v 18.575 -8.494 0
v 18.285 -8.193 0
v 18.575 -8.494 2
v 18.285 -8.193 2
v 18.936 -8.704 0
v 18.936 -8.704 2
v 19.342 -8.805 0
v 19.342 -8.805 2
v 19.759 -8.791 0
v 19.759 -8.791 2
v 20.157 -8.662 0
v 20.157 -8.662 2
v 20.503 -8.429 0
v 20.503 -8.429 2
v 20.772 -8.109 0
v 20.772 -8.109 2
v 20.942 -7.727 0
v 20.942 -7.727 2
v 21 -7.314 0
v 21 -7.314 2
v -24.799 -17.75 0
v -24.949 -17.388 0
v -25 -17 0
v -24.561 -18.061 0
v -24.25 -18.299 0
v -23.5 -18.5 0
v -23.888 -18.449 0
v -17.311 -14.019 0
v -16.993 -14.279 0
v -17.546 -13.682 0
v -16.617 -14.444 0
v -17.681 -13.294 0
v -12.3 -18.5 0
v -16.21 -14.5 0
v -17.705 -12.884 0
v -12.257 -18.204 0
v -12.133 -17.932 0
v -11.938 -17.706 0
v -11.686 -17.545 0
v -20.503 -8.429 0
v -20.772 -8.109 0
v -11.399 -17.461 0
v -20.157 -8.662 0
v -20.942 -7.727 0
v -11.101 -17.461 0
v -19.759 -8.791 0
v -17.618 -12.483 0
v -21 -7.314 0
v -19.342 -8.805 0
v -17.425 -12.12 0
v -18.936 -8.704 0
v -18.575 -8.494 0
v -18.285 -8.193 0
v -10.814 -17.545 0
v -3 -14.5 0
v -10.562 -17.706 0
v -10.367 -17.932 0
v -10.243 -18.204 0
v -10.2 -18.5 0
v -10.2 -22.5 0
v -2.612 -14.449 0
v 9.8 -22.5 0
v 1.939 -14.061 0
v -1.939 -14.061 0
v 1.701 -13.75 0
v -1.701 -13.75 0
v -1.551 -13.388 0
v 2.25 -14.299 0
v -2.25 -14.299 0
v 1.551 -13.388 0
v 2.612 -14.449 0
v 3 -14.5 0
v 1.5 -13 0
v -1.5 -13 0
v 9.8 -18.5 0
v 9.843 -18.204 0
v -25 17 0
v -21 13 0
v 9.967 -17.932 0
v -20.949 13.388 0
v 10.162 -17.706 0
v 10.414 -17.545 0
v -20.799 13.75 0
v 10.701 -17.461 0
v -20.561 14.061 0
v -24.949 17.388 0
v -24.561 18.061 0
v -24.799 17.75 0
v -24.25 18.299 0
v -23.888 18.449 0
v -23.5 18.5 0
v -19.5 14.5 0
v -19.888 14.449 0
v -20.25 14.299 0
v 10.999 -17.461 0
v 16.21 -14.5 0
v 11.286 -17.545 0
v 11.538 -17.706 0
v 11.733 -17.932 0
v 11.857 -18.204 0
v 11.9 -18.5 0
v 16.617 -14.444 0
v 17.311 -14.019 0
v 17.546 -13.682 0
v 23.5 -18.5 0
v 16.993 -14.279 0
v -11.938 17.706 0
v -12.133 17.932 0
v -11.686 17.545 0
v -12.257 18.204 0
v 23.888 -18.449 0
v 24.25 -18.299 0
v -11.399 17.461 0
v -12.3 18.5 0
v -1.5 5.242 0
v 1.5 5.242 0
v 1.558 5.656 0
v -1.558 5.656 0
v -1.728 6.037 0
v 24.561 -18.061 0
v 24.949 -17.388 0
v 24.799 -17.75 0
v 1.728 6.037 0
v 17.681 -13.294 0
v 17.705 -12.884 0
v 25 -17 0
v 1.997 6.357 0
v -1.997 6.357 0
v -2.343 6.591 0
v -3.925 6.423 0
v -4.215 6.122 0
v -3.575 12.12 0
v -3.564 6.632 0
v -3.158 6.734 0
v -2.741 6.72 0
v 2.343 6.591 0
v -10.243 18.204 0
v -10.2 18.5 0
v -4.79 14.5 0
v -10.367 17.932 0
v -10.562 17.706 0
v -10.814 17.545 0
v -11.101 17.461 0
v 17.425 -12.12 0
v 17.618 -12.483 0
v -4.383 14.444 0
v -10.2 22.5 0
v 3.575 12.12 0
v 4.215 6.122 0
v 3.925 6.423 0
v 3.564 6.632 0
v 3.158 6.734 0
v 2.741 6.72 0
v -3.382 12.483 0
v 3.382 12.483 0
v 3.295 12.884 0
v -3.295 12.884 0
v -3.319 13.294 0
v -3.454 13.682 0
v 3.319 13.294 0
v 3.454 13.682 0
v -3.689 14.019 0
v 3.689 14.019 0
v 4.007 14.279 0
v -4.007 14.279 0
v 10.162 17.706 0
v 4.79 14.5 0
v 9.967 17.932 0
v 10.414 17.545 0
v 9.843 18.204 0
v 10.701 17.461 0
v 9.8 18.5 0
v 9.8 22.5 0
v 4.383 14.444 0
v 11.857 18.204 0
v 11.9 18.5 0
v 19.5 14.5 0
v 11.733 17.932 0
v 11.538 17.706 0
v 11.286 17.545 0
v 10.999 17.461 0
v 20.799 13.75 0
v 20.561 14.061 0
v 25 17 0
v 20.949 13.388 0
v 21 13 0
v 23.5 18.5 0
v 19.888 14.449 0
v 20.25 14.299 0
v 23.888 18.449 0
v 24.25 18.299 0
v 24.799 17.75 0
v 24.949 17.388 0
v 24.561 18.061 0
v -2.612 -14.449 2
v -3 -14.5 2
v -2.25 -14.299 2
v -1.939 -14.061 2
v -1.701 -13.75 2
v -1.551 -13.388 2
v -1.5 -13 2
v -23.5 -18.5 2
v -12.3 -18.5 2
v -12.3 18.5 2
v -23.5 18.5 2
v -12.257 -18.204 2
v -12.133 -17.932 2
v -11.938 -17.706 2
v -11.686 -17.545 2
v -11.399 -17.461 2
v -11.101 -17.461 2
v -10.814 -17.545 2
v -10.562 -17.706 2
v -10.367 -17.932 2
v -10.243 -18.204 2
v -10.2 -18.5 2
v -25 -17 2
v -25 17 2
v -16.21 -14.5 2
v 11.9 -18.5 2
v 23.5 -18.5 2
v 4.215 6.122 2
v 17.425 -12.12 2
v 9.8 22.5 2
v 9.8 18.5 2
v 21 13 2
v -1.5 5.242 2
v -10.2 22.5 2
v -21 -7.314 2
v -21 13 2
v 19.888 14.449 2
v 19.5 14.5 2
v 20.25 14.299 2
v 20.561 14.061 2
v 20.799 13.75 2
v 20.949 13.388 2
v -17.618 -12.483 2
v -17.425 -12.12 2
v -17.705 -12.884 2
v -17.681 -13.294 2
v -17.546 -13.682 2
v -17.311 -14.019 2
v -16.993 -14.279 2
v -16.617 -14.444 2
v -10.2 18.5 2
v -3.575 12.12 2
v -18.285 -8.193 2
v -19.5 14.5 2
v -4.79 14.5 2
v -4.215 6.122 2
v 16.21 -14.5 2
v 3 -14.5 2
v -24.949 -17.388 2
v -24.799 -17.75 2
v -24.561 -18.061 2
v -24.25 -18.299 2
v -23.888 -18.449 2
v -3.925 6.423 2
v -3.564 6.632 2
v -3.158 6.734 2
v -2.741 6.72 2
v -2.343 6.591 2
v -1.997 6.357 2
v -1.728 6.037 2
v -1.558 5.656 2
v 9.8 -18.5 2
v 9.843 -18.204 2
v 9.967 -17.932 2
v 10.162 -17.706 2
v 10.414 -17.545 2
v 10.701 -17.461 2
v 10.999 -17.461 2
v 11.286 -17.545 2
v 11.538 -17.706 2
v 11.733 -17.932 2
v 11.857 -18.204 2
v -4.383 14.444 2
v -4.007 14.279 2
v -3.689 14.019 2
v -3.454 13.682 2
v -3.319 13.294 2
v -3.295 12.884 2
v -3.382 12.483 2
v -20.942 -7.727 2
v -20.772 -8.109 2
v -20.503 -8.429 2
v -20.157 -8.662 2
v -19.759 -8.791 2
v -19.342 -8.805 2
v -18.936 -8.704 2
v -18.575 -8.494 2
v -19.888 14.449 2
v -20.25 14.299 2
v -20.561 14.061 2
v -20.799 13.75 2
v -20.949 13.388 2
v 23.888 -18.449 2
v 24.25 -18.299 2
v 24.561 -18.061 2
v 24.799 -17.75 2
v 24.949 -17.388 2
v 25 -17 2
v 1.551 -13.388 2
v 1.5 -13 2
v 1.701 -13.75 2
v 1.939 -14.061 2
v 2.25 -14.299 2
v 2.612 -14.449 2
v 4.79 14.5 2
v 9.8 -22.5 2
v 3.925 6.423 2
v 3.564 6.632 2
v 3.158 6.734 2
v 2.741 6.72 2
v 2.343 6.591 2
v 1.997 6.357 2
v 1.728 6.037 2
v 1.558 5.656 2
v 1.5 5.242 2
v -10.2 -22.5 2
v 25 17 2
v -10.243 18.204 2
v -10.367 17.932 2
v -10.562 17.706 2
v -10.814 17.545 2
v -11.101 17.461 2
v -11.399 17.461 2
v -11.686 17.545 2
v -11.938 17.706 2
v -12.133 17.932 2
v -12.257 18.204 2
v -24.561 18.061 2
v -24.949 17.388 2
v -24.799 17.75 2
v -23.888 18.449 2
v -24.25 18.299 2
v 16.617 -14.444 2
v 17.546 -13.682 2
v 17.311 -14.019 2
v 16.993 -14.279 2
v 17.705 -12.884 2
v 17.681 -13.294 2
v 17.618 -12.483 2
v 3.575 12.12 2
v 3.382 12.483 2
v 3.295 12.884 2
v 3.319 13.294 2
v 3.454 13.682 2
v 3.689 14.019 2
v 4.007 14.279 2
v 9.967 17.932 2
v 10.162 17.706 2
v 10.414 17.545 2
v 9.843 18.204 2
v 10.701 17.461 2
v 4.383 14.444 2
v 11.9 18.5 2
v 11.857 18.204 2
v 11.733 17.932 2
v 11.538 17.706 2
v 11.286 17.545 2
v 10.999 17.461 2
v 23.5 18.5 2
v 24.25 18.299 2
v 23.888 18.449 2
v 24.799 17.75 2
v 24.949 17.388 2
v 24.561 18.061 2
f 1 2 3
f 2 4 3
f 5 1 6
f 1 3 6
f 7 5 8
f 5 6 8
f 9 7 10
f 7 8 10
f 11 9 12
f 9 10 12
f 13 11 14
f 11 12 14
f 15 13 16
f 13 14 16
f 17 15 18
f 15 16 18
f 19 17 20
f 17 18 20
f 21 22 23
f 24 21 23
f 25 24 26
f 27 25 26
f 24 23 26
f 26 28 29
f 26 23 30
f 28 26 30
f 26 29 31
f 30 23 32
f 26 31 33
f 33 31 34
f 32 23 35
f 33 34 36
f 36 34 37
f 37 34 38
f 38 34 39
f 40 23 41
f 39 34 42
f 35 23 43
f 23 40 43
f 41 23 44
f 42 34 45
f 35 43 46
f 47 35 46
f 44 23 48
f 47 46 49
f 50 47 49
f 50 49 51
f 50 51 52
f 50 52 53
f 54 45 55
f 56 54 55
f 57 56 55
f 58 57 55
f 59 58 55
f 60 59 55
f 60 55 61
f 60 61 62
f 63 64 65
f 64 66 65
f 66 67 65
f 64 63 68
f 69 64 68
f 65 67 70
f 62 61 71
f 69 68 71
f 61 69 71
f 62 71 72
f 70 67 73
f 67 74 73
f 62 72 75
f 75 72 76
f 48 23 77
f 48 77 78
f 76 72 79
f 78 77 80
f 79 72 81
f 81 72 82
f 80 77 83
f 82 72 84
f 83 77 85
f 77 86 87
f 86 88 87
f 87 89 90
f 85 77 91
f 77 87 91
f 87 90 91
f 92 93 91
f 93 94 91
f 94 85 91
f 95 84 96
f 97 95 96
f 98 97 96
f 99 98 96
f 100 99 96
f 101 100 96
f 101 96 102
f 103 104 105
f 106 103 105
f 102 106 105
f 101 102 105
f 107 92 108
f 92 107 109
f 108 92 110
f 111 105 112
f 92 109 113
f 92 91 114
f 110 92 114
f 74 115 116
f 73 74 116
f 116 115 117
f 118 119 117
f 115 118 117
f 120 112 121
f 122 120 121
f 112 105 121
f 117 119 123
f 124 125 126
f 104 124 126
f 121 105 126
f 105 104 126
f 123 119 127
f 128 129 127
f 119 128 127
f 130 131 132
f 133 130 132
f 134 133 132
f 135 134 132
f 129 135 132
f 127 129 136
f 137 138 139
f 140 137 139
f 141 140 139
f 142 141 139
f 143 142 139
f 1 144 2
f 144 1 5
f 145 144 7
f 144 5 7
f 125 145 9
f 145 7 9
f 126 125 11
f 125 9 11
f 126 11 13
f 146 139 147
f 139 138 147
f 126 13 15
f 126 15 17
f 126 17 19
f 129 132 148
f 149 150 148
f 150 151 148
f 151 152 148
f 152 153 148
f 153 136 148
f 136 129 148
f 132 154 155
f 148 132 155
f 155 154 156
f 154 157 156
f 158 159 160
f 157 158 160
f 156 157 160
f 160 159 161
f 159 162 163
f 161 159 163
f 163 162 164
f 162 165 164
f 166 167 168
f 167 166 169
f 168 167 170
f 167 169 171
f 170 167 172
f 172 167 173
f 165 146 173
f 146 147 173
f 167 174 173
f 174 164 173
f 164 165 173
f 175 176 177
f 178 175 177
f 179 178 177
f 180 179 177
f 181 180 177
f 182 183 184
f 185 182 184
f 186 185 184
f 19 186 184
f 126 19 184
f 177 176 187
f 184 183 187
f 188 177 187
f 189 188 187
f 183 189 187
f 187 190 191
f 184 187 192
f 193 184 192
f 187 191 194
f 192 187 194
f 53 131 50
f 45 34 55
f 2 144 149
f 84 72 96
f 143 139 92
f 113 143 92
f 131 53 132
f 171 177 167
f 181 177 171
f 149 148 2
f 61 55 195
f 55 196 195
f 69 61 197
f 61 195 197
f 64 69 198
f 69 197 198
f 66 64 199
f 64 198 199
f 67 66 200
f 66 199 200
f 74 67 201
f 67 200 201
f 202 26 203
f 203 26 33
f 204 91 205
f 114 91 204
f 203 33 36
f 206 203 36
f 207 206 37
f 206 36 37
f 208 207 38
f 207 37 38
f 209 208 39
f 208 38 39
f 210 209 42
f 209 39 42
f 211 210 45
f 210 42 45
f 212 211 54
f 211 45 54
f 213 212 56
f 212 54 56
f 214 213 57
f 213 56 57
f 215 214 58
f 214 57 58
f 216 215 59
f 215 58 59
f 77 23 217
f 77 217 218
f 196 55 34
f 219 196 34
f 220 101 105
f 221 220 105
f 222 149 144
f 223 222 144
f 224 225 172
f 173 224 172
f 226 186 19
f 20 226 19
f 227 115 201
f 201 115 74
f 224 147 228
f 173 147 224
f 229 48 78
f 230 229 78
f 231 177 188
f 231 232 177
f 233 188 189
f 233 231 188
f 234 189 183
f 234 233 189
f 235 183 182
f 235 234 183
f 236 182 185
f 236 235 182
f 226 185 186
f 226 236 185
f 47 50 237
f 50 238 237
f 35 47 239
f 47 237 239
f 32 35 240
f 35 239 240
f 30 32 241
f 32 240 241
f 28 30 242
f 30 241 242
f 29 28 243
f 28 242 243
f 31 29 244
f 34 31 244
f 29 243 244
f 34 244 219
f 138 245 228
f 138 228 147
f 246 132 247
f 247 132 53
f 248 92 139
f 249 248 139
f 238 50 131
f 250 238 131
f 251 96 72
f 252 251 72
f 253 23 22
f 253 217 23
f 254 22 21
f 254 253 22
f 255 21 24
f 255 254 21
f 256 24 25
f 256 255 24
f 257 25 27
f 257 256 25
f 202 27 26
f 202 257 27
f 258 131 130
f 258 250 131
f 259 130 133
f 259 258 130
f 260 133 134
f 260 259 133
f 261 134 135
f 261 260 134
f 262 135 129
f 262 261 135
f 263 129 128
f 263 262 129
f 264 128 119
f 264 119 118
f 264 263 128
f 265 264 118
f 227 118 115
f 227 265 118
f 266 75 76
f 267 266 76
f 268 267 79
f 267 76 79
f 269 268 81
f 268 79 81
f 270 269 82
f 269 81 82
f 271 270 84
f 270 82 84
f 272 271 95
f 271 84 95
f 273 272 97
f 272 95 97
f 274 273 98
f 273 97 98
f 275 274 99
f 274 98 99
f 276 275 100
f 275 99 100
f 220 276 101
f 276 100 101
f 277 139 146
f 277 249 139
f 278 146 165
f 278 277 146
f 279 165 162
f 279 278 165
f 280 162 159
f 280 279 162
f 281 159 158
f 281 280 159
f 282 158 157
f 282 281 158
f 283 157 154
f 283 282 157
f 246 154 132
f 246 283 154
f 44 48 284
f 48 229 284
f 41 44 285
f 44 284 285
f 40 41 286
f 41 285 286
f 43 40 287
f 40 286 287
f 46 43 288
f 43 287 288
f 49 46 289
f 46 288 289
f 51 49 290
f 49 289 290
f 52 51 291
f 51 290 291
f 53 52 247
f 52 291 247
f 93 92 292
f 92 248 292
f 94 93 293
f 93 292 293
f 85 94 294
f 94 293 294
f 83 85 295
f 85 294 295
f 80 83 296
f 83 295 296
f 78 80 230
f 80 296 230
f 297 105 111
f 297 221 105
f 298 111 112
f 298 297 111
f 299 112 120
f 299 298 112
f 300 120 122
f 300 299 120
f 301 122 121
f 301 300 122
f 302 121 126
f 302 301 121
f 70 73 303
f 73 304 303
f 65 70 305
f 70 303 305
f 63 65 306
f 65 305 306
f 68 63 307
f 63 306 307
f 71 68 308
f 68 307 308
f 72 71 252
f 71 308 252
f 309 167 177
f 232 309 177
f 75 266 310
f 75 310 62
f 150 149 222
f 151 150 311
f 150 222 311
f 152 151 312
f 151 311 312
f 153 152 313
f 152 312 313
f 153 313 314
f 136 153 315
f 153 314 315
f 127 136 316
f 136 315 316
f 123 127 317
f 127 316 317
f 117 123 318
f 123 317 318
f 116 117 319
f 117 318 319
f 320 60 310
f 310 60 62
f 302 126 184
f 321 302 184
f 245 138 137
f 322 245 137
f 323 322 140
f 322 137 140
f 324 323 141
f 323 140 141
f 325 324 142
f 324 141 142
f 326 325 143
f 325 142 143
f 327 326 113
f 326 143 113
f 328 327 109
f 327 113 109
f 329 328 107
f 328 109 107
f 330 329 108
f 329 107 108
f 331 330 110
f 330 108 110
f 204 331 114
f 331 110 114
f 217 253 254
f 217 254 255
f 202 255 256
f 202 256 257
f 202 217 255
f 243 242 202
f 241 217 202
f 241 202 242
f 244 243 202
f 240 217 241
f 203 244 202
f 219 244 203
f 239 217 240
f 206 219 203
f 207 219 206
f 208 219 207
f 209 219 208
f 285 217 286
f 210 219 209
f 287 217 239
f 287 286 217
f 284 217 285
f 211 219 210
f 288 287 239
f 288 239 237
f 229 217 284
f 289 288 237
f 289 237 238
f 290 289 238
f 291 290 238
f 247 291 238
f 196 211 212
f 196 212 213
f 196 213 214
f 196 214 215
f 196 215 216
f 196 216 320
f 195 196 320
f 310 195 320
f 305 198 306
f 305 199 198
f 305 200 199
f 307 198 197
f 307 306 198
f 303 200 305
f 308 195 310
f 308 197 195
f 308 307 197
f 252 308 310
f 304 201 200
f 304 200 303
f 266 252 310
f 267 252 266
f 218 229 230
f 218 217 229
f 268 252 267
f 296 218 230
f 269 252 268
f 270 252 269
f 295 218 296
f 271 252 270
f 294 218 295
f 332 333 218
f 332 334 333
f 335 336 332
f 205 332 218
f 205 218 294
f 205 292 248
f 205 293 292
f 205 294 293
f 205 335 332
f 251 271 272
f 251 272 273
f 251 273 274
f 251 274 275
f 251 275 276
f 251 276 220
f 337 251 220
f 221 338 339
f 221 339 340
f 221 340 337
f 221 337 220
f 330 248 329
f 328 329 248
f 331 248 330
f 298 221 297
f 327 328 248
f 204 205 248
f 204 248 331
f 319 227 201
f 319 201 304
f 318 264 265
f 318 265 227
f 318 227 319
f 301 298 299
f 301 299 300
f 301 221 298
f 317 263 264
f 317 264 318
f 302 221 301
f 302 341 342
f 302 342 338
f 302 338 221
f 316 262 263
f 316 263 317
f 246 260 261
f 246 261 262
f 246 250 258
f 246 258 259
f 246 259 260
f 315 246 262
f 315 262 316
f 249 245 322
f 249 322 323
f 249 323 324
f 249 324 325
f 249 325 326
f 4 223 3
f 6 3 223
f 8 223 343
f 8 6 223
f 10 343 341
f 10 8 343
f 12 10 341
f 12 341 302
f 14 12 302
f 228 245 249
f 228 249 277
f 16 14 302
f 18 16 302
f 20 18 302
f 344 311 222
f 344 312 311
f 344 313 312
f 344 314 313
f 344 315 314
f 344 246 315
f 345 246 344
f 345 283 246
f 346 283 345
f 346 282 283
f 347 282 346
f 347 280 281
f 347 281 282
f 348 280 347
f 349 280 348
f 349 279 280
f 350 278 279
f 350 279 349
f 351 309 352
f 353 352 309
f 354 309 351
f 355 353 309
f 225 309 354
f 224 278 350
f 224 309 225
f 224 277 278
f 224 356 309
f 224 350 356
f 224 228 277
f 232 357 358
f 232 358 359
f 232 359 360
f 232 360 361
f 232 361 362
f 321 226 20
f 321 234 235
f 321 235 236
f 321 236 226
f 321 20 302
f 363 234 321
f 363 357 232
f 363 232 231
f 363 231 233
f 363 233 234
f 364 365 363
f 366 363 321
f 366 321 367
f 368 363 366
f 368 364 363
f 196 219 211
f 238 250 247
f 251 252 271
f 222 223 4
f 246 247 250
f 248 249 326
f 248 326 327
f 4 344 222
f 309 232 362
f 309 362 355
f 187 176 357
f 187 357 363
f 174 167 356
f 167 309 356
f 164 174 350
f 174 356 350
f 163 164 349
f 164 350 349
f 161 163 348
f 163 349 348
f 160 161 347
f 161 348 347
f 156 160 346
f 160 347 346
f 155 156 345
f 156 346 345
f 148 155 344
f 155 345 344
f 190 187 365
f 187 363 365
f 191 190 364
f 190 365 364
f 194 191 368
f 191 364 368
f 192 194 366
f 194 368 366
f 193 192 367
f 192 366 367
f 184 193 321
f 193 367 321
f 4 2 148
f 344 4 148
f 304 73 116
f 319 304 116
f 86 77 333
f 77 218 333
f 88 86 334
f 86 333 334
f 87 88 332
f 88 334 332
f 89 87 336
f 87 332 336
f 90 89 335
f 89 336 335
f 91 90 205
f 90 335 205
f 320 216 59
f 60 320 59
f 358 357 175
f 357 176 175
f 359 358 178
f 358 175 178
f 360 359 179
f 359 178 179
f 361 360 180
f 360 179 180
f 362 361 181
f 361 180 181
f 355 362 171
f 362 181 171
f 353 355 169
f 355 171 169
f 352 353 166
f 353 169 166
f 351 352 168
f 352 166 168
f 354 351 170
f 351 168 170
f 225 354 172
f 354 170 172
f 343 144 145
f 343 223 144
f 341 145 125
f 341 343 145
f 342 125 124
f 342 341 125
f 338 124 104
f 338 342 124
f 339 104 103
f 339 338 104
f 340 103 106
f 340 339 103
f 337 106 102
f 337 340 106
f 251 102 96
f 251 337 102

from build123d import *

# Parameters (mm, degrees)
SKETCH_1_W          = 50
SKETCH_1_H          = 37
EXTRUDE_1_DEPTH     = 2
SKETCH_2_W          = 20
SKETCH_2_H          = 2
EXTRUDE_2_DEPTH     = 4
SKETCH_3_R          = 1.05
CUT_EXTRUDE_1_DEPTH = 3
CUT_EXTRUDE_3_DEPTH = 10
FILLET_1_R          = 1.5


with BuildPart() as part:
    # 草图1 → 凸台-拉伸1 (new body)
    with BuildSketch(Plane.XY):
        Rectangle(SKETCH_1_W, SKETCH_1_H)
    extrude(amount=EXTRUDE_1_DEPTH)

    # 草图2 → 凸台-拉伸2 (add)
    with BuildSketch(Plane(origin=(0, 18.5, 0), x_dir=(1, 0, 0), z_dir=(0, 1, 0))):
        with Locations((-0.2, -1)):
            Rectangle(SKETCH_2_W, SKETCH_2_H)
    extrude_2 = extrude(amount=EXTRUDE_2_DEPTH)

    # 镜向1: 凸台-拉伸2 across plane
    add(extrude_2.mirror(Plane.ZX))

    # 草图3 → 切除-拉伸1 (cut)
    with BuildSketch(Plane(origin=(0, 0, 0), x_dir=(-1, 0, 0), z_dir=(0, 0, -1))):
        with Locations((11.25, 18.5)):
            Circle(SKETCH_3_R)
        with Locations((-10.85, 18.5)):
            Circle(SKETCH_3_R)
        with Locations((-10.85, -18.5)):
            Circle(SKETCH_3_R)
        with Locations((11.25, -18.5)):
            Circle(SKETCH_3_R)
    extrude(amount=-CUT_EXTRUDE_1_DEPTH, mode=Mode.SUBTRACT)

    # 草图4 → 切除-拉伸3 (cut)
    with BuildSketch(Plane(origin=(0, 0, 0), x_dir=(-1, 0, 0), z_dir=(0, 0, -1))):
        Polygon((-21, 14.5), (-21, -11.94249803), (-1.851984185, 14.5), align=None)
        Polygon((-19.148015815, -14.5), (-1.5, -14.5), (-1.5, 9.871069459), align=None)
        Polygon((1.5, 9.871069459), (1.5, -14.5), (19.148015815, -14.5), align=None)
        Polygon((1.851984185, 14.5), (21, -11.94249803), (21, 14.5), align=None)
    extrude(amount=-CUT_EXTRUDE_3_DEPTH, mode=Mode.SUBTRACT)

    # 圆角1
    fillet_1_edges = [part.edges().sort_by_distance(p)[0] for p in [
        (-1.851984185, 14.5, 1),
        (-21, 14.5, 1),
        (-21, -11.94249803, 1),
        (1.851984185, 14.5, 1),
        (21, -11.94249803, 1),
        (21, 14.5, 1),
        (25, -18.5, 1),
        (-25, -18.5, 1),
        (-25, 18.5, 1),
        (25, 18.5, 1),
        (1.5, 9.871069459, 1),
        (1.5, -14.5, 1),
        (19.148015815, -14.5, 1),
        (-1.5, 9.871069459, 1),
        (-19.148015815, -14.5, 1),
        (-1.5, -14.5, 1),
    ]]
    fillet(fillet_1_edges, radius=FILLET_1_R)


solid = part.part
